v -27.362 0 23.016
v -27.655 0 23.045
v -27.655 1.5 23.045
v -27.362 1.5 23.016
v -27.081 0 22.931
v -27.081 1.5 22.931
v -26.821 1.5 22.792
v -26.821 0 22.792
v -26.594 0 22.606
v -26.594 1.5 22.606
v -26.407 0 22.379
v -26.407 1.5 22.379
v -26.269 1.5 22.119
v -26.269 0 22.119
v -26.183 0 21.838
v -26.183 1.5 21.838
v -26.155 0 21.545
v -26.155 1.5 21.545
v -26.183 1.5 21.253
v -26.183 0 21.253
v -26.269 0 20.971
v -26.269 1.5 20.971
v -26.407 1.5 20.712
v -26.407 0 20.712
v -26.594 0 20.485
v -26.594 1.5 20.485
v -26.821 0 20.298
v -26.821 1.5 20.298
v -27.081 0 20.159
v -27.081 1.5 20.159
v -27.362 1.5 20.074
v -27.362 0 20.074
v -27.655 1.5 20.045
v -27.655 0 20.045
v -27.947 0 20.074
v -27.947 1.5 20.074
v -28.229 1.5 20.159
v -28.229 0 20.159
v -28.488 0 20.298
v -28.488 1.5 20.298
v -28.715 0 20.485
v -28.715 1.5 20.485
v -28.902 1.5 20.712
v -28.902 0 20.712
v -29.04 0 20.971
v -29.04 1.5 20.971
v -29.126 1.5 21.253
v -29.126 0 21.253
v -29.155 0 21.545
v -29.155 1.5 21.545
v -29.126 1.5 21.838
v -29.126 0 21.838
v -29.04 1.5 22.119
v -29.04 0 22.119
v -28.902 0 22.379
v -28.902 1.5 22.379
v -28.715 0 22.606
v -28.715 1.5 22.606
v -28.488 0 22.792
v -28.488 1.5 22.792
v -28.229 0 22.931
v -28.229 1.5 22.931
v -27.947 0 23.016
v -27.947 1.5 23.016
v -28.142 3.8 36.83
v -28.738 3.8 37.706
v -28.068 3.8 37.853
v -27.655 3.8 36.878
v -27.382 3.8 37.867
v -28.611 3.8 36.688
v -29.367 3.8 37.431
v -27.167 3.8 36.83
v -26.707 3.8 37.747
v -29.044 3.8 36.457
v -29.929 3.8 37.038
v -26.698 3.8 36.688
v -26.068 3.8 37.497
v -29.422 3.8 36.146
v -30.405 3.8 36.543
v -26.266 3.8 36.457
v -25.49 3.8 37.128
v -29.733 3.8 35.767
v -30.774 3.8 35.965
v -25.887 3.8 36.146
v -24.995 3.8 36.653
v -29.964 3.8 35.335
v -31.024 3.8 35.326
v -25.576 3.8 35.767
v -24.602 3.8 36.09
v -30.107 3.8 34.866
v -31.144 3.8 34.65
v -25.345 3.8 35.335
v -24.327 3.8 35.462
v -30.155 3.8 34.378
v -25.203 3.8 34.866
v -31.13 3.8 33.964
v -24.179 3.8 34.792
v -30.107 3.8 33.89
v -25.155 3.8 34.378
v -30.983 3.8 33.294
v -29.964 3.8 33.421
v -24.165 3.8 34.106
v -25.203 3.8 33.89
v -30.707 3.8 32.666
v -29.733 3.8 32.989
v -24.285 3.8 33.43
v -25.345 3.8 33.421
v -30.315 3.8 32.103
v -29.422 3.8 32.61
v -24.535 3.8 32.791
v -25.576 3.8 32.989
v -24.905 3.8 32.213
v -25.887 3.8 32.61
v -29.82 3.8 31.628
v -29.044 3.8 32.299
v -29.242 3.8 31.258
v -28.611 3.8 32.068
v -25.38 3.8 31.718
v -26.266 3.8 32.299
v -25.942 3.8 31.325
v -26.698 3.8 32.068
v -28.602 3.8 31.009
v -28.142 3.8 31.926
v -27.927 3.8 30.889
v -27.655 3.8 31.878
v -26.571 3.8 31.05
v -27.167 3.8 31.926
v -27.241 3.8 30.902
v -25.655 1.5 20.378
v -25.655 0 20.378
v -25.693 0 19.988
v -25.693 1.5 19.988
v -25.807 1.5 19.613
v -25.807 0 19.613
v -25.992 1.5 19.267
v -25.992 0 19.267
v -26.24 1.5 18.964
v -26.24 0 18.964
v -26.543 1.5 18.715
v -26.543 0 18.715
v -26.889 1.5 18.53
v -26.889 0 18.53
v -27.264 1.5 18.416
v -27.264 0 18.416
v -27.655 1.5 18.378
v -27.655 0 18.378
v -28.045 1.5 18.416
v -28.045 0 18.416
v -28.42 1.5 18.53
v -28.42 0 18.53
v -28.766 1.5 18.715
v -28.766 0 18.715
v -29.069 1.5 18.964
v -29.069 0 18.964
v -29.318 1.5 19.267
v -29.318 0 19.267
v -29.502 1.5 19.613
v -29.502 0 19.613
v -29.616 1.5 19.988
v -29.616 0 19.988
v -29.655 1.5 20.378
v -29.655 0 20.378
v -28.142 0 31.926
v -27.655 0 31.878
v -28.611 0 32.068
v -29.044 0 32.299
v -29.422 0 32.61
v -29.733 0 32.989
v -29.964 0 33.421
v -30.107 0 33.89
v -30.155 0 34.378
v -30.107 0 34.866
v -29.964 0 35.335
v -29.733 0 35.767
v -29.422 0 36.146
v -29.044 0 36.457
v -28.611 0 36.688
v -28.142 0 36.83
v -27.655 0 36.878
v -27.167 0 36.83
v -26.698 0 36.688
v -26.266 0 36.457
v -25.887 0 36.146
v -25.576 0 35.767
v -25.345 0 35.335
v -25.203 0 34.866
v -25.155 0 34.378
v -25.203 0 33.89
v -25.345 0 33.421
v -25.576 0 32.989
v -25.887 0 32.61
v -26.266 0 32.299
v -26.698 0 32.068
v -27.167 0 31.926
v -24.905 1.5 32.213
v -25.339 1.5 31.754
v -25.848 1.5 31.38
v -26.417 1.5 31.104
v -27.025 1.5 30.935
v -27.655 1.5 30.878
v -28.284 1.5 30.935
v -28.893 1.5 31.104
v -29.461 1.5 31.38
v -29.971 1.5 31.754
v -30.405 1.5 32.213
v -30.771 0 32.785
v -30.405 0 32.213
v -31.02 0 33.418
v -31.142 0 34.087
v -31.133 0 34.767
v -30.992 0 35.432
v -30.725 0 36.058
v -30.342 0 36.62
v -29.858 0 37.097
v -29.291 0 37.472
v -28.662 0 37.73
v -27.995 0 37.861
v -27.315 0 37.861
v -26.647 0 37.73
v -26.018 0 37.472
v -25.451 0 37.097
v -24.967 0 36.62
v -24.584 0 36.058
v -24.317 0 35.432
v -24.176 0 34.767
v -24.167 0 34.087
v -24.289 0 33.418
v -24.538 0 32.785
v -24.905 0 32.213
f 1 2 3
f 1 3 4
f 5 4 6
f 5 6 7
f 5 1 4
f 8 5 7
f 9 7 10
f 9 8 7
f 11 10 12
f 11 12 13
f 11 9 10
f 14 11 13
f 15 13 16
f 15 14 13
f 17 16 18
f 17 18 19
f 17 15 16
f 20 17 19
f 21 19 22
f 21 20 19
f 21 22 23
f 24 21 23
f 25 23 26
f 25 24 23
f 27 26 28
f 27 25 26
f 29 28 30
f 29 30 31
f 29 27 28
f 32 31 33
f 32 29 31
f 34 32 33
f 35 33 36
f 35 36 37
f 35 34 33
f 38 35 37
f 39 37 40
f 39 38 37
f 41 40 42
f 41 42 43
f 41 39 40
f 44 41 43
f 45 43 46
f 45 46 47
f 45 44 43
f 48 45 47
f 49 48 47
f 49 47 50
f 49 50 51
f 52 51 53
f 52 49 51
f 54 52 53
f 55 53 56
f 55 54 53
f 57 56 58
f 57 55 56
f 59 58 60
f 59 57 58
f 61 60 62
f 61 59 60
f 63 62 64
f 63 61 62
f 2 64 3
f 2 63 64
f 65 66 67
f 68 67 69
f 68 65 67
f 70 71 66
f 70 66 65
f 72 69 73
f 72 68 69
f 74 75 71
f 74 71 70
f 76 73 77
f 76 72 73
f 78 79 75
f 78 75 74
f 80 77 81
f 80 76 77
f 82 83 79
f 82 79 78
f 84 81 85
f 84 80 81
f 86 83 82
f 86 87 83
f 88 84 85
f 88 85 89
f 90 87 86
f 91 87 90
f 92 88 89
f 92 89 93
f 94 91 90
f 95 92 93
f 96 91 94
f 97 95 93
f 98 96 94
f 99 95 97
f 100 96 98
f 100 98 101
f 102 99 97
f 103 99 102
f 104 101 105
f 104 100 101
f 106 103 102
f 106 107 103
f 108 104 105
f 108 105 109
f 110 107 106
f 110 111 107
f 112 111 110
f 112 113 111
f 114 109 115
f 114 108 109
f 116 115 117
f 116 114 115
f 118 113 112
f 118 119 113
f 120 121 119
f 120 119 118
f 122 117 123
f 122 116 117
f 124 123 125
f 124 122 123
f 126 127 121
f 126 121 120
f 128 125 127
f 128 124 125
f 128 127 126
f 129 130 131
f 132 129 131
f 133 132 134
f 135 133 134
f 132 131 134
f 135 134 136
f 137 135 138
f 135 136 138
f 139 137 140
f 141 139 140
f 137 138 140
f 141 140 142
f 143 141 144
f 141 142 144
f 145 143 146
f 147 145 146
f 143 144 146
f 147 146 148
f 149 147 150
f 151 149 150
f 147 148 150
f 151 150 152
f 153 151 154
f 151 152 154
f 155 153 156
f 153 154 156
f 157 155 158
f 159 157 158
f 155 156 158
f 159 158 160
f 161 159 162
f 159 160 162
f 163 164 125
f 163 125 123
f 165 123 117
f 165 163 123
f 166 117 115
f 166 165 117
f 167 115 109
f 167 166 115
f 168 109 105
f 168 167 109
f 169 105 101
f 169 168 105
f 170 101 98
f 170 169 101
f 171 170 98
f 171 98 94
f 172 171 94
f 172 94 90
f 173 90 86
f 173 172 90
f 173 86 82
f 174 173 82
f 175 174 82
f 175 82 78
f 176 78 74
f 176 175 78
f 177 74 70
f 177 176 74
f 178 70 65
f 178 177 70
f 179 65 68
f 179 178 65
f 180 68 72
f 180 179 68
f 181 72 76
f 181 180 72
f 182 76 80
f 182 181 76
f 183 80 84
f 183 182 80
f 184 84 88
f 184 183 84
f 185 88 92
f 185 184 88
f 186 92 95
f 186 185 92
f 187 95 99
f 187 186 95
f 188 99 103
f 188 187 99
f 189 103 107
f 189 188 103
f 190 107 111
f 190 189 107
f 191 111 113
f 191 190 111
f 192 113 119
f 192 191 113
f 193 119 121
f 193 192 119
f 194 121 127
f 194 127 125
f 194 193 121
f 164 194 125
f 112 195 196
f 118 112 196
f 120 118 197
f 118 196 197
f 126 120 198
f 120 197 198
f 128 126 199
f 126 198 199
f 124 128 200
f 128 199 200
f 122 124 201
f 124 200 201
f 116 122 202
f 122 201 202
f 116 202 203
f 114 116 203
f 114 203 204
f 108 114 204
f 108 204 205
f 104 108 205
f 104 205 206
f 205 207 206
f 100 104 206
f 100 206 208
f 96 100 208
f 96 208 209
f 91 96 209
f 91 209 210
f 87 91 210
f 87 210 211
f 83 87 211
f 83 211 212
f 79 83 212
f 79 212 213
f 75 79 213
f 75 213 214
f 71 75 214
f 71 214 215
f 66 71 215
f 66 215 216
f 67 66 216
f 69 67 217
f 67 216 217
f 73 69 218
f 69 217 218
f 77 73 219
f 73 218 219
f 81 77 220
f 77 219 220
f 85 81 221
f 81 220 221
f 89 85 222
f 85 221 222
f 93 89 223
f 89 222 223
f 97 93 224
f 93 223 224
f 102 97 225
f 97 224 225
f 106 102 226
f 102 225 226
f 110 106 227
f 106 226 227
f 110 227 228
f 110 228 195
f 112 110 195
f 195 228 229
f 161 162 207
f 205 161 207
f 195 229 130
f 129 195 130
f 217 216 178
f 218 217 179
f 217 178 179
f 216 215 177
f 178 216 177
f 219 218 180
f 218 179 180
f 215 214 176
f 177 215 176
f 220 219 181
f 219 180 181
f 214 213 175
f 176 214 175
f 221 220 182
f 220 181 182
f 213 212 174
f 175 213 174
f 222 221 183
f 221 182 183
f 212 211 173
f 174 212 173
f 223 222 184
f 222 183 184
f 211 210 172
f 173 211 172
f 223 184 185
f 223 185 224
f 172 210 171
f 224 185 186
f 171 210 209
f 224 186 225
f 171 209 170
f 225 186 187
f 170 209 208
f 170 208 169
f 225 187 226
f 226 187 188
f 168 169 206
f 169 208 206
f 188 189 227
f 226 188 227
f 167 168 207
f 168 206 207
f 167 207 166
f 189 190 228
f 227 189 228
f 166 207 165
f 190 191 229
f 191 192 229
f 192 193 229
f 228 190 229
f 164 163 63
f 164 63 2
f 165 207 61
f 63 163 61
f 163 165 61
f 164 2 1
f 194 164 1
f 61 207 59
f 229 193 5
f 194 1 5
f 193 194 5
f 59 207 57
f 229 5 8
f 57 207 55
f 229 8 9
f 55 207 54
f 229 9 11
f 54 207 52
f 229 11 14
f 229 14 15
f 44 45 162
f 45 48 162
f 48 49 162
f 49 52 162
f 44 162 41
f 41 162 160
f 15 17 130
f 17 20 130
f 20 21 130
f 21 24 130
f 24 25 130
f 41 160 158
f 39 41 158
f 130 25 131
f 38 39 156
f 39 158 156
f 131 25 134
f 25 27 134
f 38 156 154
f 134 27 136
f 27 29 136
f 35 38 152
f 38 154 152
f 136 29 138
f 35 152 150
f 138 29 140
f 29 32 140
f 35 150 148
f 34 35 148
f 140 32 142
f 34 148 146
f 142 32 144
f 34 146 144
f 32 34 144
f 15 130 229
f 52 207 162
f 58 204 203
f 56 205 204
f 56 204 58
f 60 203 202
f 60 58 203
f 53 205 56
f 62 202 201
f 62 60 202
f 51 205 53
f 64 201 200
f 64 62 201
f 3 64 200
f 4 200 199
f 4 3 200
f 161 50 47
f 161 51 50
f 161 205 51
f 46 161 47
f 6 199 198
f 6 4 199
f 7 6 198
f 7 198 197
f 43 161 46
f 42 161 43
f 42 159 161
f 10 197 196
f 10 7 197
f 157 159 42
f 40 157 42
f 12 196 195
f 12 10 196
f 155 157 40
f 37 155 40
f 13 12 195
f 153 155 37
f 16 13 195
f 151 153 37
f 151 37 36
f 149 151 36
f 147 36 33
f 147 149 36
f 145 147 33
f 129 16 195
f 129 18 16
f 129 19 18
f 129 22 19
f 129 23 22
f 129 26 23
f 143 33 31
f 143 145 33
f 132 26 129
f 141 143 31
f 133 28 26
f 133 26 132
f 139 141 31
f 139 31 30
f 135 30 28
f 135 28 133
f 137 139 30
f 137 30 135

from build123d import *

# Parameters (mm, degrees)
SKETCH1_R           = 1.5
BOSS_EXTRUDE4_DEPTH = 1.5
SKETCH1_7_R         = 2.5
BOSS_EXTRUDE5_DEPTH = 3.8


with BuildPart() as part:
    # Sketch1 → Boss-Extrude4 (new body)
    with BuildSketch(Plane(origin=(0, 0, 0), x_dir=(1, 0, 0), z_dir=(0, 1, 0))):
        with BuildLine():
            Line((-29.654588032, -20.377951177), (-30.404588032, -32.212887668))
            ThreePointArc((-30.404588032, -32.212887668), (-27.654588032, -30.877951177), (-24.904588032, -32.212887668))
            Line((-24.904588032, -32.212887668), (-25.654588032, -20.377951177))
            ThreePointArc((-25.654588032, -20.377951177), (-27.654588032, -18.377951177), (-29.654588032, -20.377951177))
        make_face()
        with Locations((-27.654588032, -21.545225809)):
            Circle(SKETCH1_R, mode=Mode.SUBTRACT)
    extrude(amount=BOSS_EXTRUDE4_DEPTH)

    # Sketch1<7> → Boss-Extrude5 (add)
    with BuildSketch(Plane(origin=(0, 0, 0), x_dir=(1, 0, 0), z_dir=(0, 1, 0))):
        with BuildLine():
            ThreePointArc((-24.904588032, -32.212887668), (-27.654588032, -30.877951177), (-30.404588032, -32.212887668))
            ThreePointArc((-30.404588032, -32.212887668), (-28.800231955, -37.685140316), (-24.154588032, -34.377951177))
            ThreePointArc((-24.154588032, -34.377951177), (-24.347398893, -33.232307253), (-24.904588032, -32.212887668))
        make_face()
        with Locations((-27.654588032, -34.377951177)):
            Circle(SKETCH1_7_R, mode=Mode.SUBTRACT)
    extrude(amount=BOSS_EXTRUDE5_DEPTH)


solid = part.part
